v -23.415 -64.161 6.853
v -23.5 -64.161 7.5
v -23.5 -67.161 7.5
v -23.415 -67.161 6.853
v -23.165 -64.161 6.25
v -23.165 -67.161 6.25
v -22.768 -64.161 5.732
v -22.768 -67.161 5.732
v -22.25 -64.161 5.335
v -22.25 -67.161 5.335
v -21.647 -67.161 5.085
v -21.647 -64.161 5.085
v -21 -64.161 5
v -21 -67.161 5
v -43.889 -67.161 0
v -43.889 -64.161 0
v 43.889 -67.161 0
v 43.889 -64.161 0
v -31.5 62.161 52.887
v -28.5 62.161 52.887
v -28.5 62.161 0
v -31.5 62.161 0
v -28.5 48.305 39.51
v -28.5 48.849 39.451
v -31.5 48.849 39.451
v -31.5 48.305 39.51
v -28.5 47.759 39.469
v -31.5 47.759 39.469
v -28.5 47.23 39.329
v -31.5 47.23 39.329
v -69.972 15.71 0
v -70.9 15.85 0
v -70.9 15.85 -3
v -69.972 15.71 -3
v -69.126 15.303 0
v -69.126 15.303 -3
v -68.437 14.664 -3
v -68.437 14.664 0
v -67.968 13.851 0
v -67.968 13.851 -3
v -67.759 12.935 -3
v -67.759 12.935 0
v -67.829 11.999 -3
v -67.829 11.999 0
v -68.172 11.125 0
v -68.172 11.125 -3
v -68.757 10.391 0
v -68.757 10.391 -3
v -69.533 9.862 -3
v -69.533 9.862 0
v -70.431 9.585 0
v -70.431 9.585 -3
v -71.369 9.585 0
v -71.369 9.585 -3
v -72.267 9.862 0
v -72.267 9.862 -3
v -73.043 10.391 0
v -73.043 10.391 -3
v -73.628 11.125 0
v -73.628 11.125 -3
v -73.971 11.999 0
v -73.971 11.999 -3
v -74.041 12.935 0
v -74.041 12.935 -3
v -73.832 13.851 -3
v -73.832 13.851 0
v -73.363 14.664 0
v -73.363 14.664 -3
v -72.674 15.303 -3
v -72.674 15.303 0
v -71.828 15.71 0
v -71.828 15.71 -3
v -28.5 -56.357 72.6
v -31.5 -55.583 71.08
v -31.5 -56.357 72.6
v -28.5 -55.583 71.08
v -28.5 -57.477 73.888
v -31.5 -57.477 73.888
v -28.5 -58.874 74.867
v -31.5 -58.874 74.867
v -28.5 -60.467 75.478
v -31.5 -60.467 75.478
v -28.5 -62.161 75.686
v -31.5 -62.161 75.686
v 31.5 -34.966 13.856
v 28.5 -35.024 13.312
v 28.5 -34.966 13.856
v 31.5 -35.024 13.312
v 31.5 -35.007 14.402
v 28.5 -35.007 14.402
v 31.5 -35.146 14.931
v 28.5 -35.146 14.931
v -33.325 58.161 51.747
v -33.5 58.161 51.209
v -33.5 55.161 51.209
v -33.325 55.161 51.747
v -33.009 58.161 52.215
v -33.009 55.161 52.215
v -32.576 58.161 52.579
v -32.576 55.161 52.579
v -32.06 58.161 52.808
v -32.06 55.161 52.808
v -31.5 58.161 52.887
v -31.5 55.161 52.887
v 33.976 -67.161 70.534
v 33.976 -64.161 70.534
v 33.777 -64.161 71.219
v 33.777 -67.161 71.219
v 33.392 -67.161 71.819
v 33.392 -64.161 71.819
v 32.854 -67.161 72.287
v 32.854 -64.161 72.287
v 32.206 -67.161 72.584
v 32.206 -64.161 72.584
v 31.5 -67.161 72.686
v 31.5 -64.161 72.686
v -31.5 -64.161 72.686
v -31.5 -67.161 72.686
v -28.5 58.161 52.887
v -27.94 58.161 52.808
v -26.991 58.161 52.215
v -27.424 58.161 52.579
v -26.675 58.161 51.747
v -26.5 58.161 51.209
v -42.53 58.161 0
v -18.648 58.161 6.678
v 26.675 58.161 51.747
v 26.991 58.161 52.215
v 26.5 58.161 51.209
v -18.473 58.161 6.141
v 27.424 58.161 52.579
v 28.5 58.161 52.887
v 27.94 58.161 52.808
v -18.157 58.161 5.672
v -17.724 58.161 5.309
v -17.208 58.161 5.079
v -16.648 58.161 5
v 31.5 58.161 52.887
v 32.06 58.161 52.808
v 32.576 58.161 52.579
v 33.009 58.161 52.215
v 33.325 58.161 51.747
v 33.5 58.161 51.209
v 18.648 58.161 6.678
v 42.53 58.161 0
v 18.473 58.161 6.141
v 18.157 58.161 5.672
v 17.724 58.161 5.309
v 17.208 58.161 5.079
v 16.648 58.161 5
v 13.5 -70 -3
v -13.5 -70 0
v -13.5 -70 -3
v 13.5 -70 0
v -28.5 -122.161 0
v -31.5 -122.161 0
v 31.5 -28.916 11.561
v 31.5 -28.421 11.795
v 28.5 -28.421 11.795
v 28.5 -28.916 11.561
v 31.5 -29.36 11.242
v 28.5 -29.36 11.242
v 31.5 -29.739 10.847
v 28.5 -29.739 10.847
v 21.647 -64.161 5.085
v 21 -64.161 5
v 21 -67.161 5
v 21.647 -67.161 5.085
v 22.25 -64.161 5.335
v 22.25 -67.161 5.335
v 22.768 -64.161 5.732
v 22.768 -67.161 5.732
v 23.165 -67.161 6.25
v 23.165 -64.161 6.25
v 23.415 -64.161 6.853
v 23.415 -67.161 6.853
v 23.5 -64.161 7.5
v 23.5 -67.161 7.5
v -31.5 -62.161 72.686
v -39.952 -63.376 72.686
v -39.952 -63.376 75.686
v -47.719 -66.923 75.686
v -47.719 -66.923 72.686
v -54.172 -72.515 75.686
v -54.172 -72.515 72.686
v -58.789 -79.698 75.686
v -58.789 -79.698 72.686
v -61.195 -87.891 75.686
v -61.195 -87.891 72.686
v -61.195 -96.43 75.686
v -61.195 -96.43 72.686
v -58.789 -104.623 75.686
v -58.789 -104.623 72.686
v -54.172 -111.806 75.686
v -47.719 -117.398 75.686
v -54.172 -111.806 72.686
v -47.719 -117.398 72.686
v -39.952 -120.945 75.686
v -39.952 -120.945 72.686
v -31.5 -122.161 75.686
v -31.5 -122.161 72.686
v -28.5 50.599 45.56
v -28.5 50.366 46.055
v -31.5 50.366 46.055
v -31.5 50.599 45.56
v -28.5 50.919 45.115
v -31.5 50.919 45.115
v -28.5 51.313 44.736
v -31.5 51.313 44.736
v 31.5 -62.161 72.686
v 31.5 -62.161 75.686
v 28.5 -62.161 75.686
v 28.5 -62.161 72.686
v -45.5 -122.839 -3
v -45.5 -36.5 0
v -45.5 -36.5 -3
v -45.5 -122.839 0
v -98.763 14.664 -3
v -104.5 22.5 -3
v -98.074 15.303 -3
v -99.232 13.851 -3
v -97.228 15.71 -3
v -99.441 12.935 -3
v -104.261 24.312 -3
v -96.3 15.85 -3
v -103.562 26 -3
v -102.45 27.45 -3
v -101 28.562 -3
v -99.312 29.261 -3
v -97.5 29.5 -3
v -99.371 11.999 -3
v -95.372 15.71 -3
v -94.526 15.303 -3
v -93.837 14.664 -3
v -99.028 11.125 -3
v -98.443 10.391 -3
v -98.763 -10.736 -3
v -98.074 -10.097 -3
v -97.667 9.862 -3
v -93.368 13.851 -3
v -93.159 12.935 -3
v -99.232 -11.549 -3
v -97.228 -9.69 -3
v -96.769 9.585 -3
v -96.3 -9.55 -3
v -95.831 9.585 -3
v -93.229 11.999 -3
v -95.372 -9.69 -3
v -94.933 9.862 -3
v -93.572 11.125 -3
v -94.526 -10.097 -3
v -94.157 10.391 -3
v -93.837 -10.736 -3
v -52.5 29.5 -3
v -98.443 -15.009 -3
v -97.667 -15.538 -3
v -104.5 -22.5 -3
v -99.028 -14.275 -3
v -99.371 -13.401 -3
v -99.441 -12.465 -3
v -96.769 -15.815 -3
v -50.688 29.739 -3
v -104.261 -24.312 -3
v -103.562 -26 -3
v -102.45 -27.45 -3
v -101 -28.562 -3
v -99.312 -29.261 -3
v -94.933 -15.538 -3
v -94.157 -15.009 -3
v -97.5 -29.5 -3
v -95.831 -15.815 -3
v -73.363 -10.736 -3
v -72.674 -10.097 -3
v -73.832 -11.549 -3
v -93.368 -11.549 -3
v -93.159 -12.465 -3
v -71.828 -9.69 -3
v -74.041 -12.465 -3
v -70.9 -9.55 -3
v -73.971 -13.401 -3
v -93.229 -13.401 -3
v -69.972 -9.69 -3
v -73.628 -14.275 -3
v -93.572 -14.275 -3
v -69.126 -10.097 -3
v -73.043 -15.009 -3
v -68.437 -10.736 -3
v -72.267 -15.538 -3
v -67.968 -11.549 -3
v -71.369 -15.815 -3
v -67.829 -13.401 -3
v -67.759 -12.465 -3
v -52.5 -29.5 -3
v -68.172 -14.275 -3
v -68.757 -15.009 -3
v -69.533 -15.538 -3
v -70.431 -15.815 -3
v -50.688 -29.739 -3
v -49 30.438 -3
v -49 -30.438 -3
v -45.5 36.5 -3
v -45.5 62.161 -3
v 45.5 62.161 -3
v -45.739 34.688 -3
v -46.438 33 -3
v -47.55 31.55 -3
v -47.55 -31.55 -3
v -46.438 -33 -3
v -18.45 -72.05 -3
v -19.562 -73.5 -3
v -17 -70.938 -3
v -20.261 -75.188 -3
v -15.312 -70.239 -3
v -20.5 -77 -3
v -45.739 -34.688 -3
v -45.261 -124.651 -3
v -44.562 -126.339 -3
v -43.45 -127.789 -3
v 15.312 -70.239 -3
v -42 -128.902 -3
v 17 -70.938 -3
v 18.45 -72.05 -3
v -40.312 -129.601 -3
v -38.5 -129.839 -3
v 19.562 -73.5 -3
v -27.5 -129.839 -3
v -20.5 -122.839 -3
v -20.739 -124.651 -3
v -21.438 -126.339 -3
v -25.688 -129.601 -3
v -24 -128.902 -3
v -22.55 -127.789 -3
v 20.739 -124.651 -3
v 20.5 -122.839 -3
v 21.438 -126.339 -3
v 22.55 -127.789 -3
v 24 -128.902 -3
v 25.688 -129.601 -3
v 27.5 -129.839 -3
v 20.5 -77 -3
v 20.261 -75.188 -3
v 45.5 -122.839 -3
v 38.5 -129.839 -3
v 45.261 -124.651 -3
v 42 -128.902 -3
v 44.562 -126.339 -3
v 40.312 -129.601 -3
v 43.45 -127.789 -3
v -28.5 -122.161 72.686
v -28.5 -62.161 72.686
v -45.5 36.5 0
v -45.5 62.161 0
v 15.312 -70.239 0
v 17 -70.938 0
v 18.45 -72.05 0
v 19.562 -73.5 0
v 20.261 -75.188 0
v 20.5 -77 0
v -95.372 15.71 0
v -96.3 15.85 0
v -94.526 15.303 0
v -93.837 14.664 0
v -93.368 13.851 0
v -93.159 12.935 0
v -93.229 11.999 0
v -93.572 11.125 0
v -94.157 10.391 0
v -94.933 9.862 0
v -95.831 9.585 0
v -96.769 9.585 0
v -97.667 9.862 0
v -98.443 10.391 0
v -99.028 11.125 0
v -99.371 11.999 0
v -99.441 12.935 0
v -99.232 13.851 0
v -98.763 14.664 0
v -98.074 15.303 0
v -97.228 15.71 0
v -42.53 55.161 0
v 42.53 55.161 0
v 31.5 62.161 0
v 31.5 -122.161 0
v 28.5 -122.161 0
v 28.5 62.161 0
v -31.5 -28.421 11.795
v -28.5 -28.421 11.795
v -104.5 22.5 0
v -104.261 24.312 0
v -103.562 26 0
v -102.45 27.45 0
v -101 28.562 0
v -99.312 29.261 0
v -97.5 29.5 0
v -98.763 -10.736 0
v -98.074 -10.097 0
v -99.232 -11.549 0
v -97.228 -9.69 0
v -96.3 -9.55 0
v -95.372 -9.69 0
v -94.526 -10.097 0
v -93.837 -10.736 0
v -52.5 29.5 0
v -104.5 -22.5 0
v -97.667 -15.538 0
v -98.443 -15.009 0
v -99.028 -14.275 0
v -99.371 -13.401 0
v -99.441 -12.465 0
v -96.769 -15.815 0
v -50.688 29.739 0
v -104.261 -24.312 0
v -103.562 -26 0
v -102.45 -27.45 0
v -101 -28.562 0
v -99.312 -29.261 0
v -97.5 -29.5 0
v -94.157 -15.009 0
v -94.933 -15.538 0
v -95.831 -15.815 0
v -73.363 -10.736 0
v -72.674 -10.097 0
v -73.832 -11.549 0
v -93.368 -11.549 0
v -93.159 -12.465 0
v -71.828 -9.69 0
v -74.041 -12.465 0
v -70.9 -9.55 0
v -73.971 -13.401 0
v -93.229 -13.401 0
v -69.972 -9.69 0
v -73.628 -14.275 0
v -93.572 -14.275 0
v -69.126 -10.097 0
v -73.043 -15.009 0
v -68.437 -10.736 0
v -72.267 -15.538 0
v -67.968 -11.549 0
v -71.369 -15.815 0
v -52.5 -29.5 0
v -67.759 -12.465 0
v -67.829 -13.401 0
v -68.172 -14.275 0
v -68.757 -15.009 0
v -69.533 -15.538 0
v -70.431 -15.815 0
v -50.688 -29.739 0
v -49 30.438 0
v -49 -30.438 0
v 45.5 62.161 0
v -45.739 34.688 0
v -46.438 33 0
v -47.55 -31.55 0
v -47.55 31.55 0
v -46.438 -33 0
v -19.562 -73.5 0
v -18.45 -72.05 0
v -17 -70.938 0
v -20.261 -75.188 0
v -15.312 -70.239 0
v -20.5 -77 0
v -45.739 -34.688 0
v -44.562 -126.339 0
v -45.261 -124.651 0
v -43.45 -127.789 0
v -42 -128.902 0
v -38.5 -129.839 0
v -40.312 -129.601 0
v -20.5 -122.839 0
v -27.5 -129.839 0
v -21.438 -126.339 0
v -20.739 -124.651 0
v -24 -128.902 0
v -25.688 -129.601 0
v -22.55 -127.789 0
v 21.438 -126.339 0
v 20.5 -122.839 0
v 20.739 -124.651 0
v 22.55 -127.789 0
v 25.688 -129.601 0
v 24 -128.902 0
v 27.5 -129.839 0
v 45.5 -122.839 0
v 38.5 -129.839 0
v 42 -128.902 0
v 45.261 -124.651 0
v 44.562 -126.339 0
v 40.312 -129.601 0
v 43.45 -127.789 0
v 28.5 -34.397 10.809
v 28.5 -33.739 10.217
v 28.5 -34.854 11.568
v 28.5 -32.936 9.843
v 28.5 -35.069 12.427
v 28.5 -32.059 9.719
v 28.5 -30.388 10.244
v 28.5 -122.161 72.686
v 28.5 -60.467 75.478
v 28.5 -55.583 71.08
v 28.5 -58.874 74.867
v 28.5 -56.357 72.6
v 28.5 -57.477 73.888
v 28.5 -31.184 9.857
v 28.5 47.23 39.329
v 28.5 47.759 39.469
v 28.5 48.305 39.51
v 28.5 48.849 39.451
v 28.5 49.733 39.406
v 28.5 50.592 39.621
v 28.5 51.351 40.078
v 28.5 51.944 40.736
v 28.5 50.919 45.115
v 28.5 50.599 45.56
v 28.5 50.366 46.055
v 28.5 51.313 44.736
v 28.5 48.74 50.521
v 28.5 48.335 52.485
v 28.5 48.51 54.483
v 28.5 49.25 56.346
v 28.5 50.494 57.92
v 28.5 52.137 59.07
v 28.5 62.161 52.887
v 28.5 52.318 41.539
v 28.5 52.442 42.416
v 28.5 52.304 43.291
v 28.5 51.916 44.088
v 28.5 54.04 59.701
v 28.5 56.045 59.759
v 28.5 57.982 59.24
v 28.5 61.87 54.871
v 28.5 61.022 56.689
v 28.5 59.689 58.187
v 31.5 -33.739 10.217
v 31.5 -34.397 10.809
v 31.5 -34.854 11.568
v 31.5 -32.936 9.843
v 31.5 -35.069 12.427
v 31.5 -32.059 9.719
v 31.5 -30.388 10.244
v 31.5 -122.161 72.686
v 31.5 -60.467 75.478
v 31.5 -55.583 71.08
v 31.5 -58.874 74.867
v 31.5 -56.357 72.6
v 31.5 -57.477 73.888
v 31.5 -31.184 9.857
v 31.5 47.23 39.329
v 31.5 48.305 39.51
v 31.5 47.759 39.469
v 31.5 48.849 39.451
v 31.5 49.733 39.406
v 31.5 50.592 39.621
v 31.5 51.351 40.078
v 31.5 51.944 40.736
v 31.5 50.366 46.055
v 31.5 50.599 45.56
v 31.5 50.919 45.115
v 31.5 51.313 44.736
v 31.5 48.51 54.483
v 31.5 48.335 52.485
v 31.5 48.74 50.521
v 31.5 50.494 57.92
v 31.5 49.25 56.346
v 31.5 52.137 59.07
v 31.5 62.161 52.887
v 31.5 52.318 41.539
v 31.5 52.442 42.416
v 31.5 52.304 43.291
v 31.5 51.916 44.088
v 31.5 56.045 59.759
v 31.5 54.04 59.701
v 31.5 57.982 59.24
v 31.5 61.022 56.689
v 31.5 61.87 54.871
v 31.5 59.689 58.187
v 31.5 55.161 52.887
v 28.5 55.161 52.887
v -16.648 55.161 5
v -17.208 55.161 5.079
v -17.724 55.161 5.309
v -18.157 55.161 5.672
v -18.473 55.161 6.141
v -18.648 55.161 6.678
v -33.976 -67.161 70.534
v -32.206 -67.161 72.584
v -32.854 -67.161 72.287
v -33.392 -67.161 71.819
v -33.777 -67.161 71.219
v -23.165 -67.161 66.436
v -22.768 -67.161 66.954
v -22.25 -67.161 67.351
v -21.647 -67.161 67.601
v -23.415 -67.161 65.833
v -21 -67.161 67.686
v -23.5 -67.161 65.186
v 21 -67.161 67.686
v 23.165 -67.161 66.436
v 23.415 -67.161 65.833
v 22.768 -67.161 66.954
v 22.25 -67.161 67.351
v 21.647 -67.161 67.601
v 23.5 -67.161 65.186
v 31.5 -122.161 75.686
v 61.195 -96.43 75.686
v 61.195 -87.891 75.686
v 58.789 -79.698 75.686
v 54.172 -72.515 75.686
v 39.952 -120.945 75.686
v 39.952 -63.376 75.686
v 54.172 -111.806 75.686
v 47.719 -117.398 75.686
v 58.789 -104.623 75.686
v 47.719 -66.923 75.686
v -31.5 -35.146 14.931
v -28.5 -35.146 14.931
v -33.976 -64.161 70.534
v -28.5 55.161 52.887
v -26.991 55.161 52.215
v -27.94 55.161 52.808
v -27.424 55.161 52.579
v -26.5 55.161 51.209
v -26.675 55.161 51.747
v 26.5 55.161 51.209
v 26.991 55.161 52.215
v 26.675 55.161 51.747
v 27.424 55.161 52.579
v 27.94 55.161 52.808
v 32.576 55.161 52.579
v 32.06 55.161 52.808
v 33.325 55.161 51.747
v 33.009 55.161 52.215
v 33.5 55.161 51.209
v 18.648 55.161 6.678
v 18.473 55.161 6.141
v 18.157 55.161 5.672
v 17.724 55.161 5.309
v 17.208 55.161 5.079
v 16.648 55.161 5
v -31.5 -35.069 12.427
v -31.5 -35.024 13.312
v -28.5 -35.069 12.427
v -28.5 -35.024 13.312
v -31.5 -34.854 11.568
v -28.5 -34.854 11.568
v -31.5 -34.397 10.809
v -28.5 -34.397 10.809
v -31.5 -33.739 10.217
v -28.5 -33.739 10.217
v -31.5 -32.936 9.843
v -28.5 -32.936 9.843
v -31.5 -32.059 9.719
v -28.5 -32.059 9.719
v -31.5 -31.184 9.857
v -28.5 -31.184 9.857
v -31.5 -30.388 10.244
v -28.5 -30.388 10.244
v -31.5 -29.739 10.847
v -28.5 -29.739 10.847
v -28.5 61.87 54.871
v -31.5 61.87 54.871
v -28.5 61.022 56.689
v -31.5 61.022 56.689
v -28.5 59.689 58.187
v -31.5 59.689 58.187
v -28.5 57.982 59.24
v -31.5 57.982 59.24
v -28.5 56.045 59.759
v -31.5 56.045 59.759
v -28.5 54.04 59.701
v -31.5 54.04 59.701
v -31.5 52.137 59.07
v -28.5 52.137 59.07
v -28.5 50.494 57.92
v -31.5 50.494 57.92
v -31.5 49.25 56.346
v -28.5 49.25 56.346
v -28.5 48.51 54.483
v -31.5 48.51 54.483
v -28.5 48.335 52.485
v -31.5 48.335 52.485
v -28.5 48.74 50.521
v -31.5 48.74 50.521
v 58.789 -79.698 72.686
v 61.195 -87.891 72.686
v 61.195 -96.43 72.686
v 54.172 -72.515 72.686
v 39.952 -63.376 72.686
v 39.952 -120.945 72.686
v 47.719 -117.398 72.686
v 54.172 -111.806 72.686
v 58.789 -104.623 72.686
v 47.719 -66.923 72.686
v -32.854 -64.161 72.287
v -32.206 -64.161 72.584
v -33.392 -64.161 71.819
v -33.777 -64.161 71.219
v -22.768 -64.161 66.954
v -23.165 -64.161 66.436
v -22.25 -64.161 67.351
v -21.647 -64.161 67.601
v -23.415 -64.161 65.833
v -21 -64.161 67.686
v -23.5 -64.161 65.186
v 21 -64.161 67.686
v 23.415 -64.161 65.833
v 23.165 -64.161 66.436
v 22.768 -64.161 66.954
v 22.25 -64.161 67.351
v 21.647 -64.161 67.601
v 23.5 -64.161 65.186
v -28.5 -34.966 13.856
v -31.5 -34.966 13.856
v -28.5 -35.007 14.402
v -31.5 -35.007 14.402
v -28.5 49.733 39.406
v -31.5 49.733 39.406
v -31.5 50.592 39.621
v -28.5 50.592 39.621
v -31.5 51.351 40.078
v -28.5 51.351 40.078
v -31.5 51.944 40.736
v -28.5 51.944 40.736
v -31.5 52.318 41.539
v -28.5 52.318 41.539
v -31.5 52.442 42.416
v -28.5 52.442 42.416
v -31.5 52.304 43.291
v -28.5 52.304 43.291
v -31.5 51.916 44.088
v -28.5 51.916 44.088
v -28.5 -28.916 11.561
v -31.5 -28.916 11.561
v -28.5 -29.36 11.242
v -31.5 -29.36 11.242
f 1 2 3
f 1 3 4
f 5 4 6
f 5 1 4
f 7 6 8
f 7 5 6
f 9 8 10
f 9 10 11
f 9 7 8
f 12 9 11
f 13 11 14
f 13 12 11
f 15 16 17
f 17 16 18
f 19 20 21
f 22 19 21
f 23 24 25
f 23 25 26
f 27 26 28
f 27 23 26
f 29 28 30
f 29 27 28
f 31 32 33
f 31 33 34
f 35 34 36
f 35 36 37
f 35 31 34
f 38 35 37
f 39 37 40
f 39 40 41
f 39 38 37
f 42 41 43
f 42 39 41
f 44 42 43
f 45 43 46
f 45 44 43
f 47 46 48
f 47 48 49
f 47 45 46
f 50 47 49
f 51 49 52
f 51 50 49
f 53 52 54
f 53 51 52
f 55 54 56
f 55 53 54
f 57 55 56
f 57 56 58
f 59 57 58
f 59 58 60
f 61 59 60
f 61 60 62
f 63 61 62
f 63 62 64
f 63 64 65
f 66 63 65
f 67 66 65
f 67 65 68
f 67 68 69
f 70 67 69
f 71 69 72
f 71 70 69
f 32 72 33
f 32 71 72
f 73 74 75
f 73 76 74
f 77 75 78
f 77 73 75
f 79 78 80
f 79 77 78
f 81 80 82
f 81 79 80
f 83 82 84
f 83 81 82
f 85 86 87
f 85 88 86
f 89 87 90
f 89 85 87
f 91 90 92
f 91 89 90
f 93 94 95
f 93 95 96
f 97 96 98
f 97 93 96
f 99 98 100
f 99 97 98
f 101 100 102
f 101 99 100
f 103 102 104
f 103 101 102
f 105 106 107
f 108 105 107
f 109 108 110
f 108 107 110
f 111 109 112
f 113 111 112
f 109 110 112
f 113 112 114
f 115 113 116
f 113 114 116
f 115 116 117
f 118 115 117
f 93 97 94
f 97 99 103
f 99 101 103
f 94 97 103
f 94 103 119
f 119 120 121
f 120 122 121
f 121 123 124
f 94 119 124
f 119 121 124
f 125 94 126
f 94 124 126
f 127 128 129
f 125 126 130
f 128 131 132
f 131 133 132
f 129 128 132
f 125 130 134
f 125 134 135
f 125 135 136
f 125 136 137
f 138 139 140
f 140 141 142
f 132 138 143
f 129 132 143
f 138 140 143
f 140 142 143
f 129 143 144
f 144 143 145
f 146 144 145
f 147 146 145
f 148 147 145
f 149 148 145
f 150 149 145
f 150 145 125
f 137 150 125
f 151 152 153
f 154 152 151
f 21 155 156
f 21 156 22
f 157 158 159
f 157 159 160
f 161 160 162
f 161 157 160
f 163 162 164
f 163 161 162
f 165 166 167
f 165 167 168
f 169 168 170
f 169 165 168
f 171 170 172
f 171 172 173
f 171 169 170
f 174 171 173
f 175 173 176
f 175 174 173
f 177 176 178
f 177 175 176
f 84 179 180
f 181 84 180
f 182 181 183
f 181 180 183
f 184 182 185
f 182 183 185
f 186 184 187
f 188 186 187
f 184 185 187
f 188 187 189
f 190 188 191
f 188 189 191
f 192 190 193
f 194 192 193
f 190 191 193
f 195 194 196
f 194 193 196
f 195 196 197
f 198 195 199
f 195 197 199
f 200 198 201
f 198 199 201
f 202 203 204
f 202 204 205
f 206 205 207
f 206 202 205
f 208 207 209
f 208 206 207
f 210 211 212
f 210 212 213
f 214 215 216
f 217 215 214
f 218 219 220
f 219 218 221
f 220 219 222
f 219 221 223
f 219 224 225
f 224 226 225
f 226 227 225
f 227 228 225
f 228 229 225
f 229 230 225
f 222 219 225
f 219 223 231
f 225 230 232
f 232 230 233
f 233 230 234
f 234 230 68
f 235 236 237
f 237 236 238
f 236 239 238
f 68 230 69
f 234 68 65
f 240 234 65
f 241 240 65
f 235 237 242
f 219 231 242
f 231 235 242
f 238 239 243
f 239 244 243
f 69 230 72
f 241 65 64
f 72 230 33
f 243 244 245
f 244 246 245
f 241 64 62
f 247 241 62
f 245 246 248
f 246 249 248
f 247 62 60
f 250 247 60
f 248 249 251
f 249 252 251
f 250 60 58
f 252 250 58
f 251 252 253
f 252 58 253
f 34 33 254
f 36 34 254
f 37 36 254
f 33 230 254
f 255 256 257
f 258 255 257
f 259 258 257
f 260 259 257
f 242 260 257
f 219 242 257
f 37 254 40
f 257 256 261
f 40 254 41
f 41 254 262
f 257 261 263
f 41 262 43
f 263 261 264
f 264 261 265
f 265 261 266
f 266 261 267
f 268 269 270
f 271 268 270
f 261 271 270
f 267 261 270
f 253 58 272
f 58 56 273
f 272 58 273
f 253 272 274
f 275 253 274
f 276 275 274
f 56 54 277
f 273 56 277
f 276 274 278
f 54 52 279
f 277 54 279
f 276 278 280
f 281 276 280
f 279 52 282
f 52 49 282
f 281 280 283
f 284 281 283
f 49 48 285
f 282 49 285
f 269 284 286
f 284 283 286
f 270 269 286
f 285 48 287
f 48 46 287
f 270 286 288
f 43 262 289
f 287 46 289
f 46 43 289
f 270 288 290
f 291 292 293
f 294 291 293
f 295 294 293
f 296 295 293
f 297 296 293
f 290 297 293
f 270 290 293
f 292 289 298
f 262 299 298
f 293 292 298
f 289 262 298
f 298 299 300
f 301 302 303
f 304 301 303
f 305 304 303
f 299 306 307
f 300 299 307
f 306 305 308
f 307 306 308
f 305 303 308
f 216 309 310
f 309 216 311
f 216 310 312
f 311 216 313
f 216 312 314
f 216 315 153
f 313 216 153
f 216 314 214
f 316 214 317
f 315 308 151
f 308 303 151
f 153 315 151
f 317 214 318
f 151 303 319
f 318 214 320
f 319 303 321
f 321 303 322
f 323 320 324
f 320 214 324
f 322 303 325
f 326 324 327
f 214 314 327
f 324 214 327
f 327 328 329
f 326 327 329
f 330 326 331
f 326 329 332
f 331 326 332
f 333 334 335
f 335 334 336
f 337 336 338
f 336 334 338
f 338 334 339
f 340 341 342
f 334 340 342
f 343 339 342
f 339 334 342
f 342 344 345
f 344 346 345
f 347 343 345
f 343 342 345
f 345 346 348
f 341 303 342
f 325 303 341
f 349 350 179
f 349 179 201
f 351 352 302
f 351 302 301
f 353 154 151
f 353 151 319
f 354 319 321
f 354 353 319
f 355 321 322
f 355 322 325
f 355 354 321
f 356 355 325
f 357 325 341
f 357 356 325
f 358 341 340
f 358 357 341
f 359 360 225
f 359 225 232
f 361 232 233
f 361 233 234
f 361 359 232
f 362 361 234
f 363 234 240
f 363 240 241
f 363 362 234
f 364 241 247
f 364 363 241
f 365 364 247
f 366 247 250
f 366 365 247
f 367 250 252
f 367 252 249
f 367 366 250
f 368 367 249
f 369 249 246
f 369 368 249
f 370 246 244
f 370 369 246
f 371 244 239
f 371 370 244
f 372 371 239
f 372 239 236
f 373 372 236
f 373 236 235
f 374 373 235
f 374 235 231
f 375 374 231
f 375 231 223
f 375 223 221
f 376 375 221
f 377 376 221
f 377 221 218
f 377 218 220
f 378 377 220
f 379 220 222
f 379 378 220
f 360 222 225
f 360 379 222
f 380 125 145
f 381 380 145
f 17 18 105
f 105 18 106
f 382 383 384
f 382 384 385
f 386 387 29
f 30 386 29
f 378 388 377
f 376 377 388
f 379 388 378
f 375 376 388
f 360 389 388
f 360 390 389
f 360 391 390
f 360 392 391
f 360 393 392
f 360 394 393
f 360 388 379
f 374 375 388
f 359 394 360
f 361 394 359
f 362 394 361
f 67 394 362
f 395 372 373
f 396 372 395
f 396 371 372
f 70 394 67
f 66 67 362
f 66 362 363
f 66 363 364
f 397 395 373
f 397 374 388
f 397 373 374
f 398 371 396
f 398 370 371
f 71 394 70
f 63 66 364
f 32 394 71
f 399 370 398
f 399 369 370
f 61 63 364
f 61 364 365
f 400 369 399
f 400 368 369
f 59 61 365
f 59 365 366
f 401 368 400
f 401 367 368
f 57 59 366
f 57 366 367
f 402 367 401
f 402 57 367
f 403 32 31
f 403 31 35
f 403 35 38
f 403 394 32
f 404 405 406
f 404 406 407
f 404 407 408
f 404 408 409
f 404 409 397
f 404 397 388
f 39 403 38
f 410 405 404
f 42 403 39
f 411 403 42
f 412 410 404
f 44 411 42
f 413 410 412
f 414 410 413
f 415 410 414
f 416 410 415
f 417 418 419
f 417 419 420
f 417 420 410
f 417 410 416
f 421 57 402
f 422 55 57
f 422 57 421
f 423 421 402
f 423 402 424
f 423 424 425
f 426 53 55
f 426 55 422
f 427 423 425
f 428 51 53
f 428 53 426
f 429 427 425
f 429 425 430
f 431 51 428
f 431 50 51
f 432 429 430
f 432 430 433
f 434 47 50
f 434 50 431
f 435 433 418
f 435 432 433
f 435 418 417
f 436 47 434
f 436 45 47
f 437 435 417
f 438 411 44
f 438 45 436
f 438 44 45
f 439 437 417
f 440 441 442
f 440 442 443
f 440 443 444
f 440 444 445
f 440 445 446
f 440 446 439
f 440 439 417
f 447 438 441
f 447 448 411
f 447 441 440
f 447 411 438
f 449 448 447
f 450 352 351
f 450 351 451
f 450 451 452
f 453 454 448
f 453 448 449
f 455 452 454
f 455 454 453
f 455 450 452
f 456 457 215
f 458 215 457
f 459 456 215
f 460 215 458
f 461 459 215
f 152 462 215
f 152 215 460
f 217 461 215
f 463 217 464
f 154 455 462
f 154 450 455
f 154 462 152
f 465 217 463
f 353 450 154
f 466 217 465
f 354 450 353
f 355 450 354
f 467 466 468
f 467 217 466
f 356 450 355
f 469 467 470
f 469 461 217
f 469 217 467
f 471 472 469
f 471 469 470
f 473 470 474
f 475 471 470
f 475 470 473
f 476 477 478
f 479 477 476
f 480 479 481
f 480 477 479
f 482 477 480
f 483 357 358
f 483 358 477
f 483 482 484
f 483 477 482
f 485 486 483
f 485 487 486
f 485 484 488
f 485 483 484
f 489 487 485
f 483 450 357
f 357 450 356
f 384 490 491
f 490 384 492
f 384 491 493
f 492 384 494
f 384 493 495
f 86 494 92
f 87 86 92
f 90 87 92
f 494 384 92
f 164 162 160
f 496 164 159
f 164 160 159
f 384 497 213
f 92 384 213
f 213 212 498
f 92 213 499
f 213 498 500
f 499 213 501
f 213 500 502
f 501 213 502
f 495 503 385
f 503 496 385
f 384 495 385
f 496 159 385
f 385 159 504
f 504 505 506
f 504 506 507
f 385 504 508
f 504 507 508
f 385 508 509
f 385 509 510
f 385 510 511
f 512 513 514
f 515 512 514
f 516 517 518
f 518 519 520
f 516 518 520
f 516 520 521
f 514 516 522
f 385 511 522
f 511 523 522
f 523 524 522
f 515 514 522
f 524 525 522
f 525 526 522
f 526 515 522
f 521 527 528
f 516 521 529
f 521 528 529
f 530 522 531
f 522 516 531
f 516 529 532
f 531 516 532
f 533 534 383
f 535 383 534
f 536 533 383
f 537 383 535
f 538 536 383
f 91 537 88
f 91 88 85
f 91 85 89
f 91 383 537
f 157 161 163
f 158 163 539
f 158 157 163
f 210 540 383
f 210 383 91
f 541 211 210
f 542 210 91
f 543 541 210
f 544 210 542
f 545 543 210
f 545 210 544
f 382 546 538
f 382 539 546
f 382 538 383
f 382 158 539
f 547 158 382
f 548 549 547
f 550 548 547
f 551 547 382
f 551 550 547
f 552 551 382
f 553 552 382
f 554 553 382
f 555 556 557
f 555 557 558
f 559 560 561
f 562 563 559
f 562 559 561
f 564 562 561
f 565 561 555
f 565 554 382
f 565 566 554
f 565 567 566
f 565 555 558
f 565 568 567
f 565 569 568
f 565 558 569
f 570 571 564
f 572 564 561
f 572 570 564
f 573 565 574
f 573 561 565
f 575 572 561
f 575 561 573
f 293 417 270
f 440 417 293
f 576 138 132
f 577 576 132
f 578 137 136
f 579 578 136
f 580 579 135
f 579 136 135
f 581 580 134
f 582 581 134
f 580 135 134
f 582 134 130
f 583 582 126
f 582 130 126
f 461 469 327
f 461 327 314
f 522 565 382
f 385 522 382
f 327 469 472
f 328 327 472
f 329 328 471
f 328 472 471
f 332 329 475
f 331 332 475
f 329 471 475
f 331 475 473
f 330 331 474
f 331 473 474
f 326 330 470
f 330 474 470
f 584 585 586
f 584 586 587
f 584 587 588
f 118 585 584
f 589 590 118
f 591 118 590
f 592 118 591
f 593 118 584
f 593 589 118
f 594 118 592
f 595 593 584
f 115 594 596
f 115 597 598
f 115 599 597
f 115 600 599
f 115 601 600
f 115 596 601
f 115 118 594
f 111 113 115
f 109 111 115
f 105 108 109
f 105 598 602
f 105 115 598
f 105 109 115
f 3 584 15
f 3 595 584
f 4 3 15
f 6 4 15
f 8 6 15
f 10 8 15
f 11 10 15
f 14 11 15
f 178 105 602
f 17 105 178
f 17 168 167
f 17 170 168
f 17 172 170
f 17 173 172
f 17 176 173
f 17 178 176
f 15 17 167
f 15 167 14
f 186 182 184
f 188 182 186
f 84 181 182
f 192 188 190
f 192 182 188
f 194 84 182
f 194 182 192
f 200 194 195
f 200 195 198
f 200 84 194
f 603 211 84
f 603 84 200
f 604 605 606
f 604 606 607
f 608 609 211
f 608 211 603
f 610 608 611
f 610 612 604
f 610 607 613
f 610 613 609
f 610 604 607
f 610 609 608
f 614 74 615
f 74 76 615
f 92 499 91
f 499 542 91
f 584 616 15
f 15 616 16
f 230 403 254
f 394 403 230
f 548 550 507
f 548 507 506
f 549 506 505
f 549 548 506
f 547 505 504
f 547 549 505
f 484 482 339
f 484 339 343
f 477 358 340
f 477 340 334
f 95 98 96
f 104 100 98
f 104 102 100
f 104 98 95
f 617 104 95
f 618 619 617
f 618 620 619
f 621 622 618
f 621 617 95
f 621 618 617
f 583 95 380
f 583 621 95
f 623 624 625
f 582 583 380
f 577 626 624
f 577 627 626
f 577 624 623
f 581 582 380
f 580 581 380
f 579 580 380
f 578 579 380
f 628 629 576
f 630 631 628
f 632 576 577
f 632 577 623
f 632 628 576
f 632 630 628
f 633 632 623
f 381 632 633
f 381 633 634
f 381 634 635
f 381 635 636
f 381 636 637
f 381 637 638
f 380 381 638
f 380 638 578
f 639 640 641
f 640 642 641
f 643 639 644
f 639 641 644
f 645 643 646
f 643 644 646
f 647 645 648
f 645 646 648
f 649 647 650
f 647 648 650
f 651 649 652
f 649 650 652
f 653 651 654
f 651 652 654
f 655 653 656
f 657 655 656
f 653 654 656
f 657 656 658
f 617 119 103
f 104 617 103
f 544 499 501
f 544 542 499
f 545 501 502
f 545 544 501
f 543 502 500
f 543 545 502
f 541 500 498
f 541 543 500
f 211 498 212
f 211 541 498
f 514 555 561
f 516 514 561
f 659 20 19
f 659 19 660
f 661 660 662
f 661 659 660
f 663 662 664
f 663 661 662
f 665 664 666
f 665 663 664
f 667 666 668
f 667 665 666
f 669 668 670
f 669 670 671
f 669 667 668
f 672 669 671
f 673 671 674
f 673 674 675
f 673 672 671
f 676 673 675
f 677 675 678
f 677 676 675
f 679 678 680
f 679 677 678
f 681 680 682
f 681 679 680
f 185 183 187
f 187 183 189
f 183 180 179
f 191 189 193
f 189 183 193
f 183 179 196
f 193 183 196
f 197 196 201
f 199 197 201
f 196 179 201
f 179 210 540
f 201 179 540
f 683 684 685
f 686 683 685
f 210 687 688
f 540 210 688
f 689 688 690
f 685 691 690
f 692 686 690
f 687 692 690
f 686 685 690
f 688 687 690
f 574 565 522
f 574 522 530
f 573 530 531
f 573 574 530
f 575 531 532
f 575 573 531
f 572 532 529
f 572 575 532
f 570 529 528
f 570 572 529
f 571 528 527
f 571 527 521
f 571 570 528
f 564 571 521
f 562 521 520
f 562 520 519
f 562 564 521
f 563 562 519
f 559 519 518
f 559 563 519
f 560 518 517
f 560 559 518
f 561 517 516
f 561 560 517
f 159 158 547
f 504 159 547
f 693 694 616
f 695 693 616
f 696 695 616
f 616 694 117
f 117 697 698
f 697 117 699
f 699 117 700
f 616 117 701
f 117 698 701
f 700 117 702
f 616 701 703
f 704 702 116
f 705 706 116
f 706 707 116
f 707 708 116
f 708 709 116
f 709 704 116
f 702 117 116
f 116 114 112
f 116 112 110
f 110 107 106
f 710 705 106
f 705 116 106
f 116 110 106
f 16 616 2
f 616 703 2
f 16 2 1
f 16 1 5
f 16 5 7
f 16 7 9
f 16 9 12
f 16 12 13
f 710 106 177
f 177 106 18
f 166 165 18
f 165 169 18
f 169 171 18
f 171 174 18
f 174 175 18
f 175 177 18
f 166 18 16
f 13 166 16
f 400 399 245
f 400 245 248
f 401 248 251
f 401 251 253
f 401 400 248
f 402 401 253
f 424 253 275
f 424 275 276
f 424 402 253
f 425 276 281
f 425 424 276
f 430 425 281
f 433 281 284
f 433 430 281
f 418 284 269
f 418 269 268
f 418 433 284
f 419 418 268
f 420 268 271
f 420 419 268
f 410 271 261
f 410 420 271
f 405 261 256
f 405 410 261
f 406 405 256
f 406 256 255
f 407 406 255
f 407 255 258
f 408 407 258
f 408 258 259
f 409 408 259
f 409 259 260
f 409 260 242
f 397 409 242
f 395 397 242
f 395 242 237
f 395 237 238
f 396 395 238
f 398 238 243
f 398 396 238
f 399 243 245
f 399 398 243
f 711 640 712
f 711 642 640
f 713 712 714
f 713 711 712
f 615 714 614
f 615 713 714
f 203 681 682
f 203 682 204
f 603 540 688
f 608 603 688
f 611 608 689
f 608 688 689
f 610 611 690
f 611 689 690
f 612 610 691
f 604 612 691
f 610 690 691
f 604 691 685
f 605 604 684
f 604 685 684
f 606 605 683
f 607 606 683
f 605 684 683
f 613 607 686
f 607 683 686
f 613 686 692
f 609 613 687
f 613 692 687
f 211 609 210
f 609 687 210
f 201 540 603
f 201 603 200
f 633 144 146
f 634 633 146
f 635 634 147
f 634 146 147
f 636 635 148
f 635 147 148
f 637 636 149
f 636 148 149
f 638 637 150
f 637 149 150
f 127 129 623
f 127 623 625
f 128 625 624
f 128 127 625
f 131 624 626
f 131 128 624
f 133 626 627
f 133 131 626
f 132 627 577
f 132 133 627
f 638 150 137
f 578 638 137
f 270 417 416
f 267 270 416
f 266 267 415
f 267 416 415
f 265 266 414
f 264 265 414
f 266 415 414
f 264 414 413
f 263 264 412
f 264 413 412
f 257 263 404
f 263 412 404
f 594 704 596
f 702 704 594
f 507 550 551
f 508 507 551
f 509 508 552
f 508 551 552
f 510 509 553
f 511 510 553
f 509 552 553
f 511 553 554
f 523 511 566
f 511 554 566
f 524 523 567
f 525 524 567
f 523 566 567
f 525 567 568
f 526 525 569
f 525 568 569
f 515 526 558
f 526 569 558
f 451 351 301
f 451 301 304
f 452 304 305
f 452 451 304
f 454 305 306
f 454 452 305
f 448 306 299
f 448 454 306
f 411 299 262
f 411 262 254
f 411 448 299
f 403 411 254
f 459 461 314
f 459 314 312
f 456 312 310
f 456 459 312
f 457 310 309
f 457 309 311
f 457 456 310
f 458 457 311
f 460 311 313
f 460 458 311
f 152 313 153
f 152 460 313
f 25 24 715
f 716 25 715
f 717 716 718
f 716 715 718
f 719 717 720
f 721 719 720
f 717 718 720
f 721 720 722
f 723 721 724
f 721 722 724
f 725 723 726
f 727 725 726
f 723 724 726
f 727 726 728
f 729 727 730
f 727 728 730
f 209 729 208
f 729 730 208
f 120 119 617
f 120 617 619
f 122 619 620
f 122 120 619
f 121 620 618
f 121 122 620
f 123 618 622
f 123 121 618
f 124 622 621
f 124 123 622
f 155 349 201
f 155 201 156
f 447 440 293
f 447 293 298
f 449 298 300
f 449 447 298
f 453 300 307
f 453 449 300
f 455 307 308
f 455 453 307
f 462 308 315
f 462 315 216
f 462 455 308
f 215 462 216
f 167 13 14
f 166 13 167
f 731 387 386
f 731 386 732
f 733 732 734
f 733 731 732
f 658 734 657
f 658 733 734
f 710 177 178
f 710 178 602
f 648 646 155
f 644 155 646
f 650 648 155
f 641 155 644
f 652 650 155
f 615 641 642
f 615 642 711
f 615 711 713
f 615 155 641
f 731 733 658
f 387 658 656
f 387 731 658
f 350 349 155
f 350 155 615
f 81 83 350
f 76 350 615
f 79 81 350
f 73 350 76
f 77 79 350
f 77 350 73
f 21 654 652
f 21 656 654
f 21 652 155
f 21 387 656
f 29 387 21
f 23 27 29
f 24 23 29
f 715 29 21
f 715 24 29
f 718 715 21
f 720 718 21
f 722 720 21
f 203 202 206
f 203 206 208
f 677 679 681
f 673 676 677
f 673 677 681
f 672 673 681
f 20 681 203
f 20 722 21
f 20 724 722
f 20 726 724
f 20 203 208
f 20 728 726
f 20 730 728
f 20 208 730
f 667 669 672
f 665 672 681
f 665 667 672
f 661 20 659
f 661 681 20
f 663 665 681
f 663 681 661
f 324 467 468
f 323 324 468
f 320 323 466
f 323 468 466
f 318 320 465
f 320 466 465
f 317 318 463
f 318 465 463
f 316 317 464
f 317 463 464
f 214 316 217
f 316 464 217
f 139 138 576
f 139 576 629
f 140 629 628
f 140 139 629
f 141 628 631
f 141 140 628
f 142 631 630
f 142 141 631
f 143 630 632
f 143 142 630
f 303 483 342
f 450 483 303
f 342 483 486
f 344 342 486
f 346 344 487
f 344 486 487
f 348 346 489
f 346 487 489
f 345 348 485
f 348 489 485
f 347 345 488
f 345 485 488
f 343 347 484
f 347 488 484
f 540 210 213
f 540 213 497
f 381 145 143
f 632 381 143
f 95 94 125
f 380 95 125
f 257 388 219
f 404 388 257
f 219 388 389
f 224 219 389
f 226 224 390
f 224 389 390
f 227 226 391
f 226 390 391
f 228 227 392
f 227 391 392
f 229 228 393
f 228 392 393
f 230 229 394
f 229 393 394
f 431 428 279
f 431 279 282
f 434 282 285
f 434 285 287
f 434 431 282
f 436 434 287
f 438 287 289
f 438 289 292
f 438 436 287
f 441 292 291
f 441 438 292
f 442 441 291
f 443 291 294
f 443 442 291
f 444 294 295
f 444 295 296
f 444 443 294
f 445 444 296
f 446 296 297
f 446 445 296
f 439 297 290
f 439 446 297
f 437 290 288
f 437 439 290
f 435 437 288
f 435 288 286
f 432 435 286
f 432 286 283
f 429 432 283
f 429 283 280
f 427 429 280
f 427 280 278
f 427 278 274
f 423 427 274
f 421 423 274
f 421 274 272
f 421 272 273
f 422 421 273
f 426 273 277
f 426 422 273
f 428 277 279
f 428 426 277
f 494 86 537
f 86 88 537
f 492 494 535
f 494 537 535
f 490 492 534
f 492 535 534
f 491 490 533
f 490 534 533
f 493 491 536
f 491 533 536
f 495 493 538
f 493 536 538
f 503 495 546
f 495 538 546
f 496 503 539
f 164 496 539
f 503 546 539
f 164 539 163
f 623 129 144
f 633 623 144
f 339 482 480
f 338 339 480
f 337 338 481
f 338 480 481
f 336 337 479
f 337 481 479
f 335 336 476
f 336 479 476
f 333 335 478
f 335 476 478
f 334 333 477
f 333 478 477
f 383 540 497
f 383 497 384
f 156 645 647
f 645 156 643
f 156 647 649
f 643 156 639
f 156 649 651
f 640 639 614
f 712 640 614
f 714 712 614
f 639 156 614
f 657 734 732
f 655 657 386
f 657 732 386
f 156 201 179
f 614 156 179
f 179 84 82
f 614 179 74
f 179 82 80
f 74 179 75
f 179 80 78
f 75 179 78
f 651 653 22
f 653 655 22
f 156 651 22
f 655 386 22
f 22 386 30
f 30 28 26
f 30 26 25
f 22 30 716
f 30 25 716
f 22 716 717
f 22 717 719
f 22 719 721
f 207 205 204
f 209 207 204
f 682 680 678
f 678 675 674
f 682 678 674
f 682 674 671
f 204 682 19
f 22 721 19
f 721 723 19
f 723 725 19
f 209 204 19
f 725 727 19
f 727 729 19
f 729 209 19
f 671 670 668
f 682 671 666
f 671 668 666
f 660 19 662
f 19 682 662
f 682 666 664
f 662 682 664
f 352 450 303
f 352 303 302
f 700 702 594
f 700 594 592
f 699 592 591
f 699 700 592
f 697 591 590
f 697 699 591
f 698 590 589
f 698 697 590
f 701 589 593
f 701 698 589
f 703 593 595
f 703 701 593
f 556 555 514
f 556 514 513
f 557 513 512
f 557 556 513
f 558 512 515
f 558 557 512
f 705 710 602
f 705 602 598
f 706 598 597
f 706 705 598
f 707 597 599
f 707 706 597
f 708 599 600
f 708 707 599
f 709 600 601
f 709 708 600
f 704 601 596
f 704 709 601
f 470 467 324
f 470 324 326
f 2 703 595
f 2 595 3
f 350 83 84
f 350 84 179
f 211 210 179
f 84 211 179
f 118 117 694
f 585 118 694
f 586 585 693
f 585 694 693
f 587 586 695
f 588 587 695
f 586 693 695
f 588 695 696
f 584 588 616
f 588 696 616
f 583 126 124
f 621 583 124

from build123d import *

# Parameters (mm, degrees)
PAD_DEPTH    = 1.5
PAD001_DEPTH = 1.5
SKETCH002_R  = 3.15
PAD002_DEPTH = 3
PAD003_DEPTH = 3
PAD004_DEPTH = 3
PAD005_DEPTH = 3


with BuildPart() as leftangle_b:
    # Sketch → Pad (new body, symmetric)
    with BuildSketch(Plane.YZ.offset(-30)):
        with BuildLine():
            ThreePointArc((-55.582745, 71.08002), (-58.145558, 74.419944), (-62.160593, 75.685879))
            Line((-62.160593, 75.685879), (-62.160593, 72.685879))
            Line((-62.160593, 72.685879), (-122.160593, 72.685879))
            Line((-122.160593, 72.685879), (-122.160593, 0))
            Line((-122.160593, 0), (-62.160593, 0))
            Line((62.160593, 0), (-62.160593, 0))
            Line((62.160593, 52.887103), (62.160593, 0))
            ThreePointArc((62.160593, 52.887103), (54.040443, 59.700718), (48.740392, 50.520759))
            Line((48.740392, 50.520759), (50.365893, 46.054732))
            ThreePointArc((50.365893, 46.054732), (50.748716, 45.330174), (51.31332, 44.73624))
            ThreePointArc((48.848712, 39.450871), (52.160593, 41.123833), (51.31332, 44.73624))
            ThreePointArc((48.848712, 39.450871), (48.030811, 39.50161), (47.229695, 39.329133))
            Line((-28.420537, 11.7947), (47.229695, 39.329133))
            ThreePointArc((-28.420537, 11.7947), (-29.145094, 11.411877), (-29.739029, 10.847273))
            ThreePointArc((-35.024397, 13.311881), (-33.351435, 10), (-29.739029, 10.847273))
            ThreePointArc((-35.024397, 13.311881), (-34.973659, 14.129782), (-35.146136, 14.930899))
            Line((-55.582745, 71.08002), (-35.146136, 14.930899))
        make_face()
    extrude(amount=PAD_DEPTH, both=True)


with BuildPart() as rightangle_b:
    # Sketch001 → Pad001 (new body, symmetric)
    with BuildSketch(Plane.YZ.offset(30)):
        with BuildLine():
            ThreePointArc((-55.582745, 71.08002), (-58.145558, 74.419944), (-62.160593, 75.685879))
            Line((-62.160593, 75.685879), (-62.160593, 72.685879))
            Line((-62.160593, 72.685879), (-122.160593, 72.685879))
            Line((-122.160593, 72.685879), (-122.160593, 0))
            Line((-122.160593, 0), (-62.160593, 0))
            Line((62.160593, 0), (-62.160593, 0))
            Line((62.160593, 52.887103), (62.160593, 0))
            ThreePointArc((62.160593, 52.887103), (54.040443, 59.700718), (48.740392, 50.520759))
            Line((50.365893, 46.054732), (48.740392, 50.520759))
            ThreePointArc((50.365893, 46.054732), (50.748716, 45.330174), (51.31332, 44.73624))
            ThreePointArc((48.848712, 39.450871), (52.160593, 41.123833), (51.31332, 44.73624))
            ThreePointArc((48.848712, 39.450871), (48.030811, 39.50161), (47.229695, 39.329133))
            Line((-28.420537, 11.7947), (47.229695, 39.329133))
            ThreePointArc((-28.420537, 11.7947), (-29.145094, 11.411877), (-29.739029, 10.847273))
            ThreePointArc((-35.024397, 13.311881), (-33.351435, 10), (-29.739029, 10.847273))
            ThreePointArc((-35.024397, 13.311881), (-34.973659, 14.129782), (-35.146136, 14.930899))
            Line((-55.582745, 71.08002), (-35.146136, 14.930899))
        make_face()
    extrude(amount=PAD001_DEPTH, both=True)


with BuildPart() as base_b:
    # Sketch002 (on Face1 of ReferencePad) → Pad002 (new body)
    with BuildSketch(Plane.YX):
        with BuildLine():
            Line((-129.839407, -38.5), (-129.839407, -27.5))
            ThreePointArc((-122.839407, -20.5), (-127.789154, -22.550253), (-129.839407, -27.5))
            Line((-122.839407, -20.5), (-77, -20.5))
            ThreePointArc((-77, -20.5), (-72.050253, -18.449747), (-70, -13.5))
            Line((-70, -13.5), (-70, 13.5))
            ThreePointArc((-70, 13.5), (-72.050253, 18.449747), (-77, 20.5))
            Line((-77, 20.5), (-122.839407, 20.5))
            ThreePointArc((-129.839407, 27.5), (-127.789154, 22.550253), (-122.839407, 20.5))
            Line((-129.839407, 27.5), (-129.839407, 38.5))
            ThreePointArc((-122.839407, 45.5), (-127.789154, 43.449747), (-129.839407, 38.5))
            Line((-122.839407, 45.5), (62.160593, 45.5))
            Line((62.160593, 45.5), (62.160593, -45.5))
            Line((62.160593, -45.5), (36.5, -45.5))
            ThreePointArc((36.5, -45.5), (31.550253, -47.550253), (29.5, -52.5))
            Line((29.5, -52.5), (29.5, -97.5))
            ThreePointArc((22.5, -104.5), (27.449747, -102.449747), (29.5, -97.5))
            Line((22.5, -104.5), (-22.5, -104.5))
            ThreePointArc((-29.5, -97.5), (-27.449747, -102.449747), (-22.5, -104.5))
            Line((-29.5, -97.5), (-29.5, -52.5))
            ThreePointArc((-29.5, -52.5), (-31.550253, -47.550253), (-36.5, -45.5))
            Line((-36.5, -45.5), (-122.839407, -45.5))
            ThreePointArc((-129.839407, -38.5), (-127.789154, -43.449747), (-122.839407, -45.5))
        make_face()
        with Locations((-12.7, -96.3)):
            Circle(SKETCH002_R, mode=Mode.SUBTRACT)
        with Locations((-12.7, -70.9)):
            Circle(SKETCH002_R, mode=Mode.SUBTRACT)
        with Locations((12.7, -70.9)):
            Circle(SKETCH002_R, mode=Mode.SUBTRACT)
        with Locations((12.7, -96.3)):
            Circle(SKETCH002_R, mode=Mode.SUBTRACT)
    extrude(amount=PAD002_DEPTH)


with BuildPart() as hand_b:
    # Sketch003 (on Face1 of ReferencePad001) → Pad003 (new body)
    with BuildSketch(Plane(origin=(0, 0, 72.685879), x_dir=(0, -1, 0), z_dir=(0, 0, 1))):
        with BuildLine():
            ThreePointArc((122.160593, 31.5), (92.160593, 61.5), (62.160593, 31.5))
            Line((62.160593, 31.5), (62.160593, -31.5))
            ThreePointArc((62.160593, -31.5), (92.160593, -61.5), (122.160593, -31.5))
            Line((122.160593, 31.5), (122.160593, -31.5))
        make_face()
    extrude(amount=PAD003_DEPTH)


with BuildPart() as stabilizer_far_b:
    # Sketch004 (on Face1 of ReferencePad001001) → Pad004 (new body)
    with BuildSketch(Plane.ZX.offset(62.160593)):
        with BuildLine():
            Line((0, 42.529511), (51.208904, 33.5))
            ThreePointArc((52.887103, 31.5), (52.411973, 32.805407), (51.208904, 33.5))
            Line((52.887103, 31.5), (52.887103, 28.5))
            ThreePointArc((51.208904, 26.5), (52.411973, 27.194593), (52.887103, 28.5))
            Line((51.208904, 26.5), (6.678199, 18.648035))
            ThreePointArc((6.678199, 18.648035), (5.475129, 17.953443), (5, 16.648035))
            Line((5, 16.648035), (5, -16.648035))
            ThreePointArc((5, -16.648035), (5.475129, -17.953443), (6.678199, -18.648035))
            Line((6.678199, -18.648035), (51.208904, -26.5))
            ThreePointArc((52.887103, -28.5), (52.411973, -27.194593), (51.208904, -26.5))
            Line((52.887103, -28.5), (52.887103, -31.5))
            ThreePointArc((51.208904, -33.5), (52.411973, -32.805407), (52.887103, -31.5))
            Line((51.208904, -33.5), (0, -42.529511))
            Line((0, -42.529511), (0, 42.529511))
        make_face()
    extrude(amount=-PAD004_DEPTH)


with BuildPart() as stabilizer_far_b_1:
    # Body004 placement: moved
    add(stabilizer_far_b.part.moved(Location((0, -4, 0))))


with BuildPart() as stabilizer_close_b:
    # Sketch005 (on Face1 of ReferencePad001002) → Pad005 (new body)
    with BuildSketch(Plane(origin=(0, -122.160593, 0), x_dir=(0, 0, -1), z_dir=(0, -1, 0))):
        with BuildLine():
            Line((-70.533812, -33.97567), (0, -43.888551))
            Line((0, -43.888551), (0, 43.888551))
            Line((0, 43.888551), (-70.533812, 33.97567))
            ThreePointArc((-70.533812, 33.97567), (-72.072653, 33.140148), (-72.685879, 31.5))
            Line((-72.685879, 31.5), (-72.685879, -31.5))
            ThreePointArc((-72.685879, -31.5), (-72.072653, -33.140148), (-70.533812, -33.97567))
        make_face()
        with BuildLine():
            Line((-65.185879, -23.5), (-7.5, -23.5))
            ThreePointArc((-7.5, -23.5), (-5.732233, -22.767767), (-5, -21))
            Line((-5, -21), (-5, 21))
            ThreePointArc((-5, 21), (-5.732233, 22.767767), (-7.5, 23.5))
            Line((-7.5, 23.5), (-65.185879, 23.5))
            ThreePointArc((-65.185879, 23.5), (-66.953646, 22.767767), (-67.685879, 21))
            Line((-67.685879, 21), (-67.685879, -21))
            ThreePointArc((-67.685879, -21), (-66.953646, -22.767767), (-65.185879, -23.5))
        make_face(mode=Mode.SUBTRACT)
    extrude(amount=PAD005_DEPTH)


with BuildPart() as stabilizer_close_b_1:
    # Body005 placement: moved
    add(stabilizer_close_b.part.moved(Location((0, 58, 0))))


solid = Compound([leftangle_b.part, rightangle_b.part, base_b.part, hand_b.part, stabilizer_far_b_1.part, stabilizer_close_b_1.part])
